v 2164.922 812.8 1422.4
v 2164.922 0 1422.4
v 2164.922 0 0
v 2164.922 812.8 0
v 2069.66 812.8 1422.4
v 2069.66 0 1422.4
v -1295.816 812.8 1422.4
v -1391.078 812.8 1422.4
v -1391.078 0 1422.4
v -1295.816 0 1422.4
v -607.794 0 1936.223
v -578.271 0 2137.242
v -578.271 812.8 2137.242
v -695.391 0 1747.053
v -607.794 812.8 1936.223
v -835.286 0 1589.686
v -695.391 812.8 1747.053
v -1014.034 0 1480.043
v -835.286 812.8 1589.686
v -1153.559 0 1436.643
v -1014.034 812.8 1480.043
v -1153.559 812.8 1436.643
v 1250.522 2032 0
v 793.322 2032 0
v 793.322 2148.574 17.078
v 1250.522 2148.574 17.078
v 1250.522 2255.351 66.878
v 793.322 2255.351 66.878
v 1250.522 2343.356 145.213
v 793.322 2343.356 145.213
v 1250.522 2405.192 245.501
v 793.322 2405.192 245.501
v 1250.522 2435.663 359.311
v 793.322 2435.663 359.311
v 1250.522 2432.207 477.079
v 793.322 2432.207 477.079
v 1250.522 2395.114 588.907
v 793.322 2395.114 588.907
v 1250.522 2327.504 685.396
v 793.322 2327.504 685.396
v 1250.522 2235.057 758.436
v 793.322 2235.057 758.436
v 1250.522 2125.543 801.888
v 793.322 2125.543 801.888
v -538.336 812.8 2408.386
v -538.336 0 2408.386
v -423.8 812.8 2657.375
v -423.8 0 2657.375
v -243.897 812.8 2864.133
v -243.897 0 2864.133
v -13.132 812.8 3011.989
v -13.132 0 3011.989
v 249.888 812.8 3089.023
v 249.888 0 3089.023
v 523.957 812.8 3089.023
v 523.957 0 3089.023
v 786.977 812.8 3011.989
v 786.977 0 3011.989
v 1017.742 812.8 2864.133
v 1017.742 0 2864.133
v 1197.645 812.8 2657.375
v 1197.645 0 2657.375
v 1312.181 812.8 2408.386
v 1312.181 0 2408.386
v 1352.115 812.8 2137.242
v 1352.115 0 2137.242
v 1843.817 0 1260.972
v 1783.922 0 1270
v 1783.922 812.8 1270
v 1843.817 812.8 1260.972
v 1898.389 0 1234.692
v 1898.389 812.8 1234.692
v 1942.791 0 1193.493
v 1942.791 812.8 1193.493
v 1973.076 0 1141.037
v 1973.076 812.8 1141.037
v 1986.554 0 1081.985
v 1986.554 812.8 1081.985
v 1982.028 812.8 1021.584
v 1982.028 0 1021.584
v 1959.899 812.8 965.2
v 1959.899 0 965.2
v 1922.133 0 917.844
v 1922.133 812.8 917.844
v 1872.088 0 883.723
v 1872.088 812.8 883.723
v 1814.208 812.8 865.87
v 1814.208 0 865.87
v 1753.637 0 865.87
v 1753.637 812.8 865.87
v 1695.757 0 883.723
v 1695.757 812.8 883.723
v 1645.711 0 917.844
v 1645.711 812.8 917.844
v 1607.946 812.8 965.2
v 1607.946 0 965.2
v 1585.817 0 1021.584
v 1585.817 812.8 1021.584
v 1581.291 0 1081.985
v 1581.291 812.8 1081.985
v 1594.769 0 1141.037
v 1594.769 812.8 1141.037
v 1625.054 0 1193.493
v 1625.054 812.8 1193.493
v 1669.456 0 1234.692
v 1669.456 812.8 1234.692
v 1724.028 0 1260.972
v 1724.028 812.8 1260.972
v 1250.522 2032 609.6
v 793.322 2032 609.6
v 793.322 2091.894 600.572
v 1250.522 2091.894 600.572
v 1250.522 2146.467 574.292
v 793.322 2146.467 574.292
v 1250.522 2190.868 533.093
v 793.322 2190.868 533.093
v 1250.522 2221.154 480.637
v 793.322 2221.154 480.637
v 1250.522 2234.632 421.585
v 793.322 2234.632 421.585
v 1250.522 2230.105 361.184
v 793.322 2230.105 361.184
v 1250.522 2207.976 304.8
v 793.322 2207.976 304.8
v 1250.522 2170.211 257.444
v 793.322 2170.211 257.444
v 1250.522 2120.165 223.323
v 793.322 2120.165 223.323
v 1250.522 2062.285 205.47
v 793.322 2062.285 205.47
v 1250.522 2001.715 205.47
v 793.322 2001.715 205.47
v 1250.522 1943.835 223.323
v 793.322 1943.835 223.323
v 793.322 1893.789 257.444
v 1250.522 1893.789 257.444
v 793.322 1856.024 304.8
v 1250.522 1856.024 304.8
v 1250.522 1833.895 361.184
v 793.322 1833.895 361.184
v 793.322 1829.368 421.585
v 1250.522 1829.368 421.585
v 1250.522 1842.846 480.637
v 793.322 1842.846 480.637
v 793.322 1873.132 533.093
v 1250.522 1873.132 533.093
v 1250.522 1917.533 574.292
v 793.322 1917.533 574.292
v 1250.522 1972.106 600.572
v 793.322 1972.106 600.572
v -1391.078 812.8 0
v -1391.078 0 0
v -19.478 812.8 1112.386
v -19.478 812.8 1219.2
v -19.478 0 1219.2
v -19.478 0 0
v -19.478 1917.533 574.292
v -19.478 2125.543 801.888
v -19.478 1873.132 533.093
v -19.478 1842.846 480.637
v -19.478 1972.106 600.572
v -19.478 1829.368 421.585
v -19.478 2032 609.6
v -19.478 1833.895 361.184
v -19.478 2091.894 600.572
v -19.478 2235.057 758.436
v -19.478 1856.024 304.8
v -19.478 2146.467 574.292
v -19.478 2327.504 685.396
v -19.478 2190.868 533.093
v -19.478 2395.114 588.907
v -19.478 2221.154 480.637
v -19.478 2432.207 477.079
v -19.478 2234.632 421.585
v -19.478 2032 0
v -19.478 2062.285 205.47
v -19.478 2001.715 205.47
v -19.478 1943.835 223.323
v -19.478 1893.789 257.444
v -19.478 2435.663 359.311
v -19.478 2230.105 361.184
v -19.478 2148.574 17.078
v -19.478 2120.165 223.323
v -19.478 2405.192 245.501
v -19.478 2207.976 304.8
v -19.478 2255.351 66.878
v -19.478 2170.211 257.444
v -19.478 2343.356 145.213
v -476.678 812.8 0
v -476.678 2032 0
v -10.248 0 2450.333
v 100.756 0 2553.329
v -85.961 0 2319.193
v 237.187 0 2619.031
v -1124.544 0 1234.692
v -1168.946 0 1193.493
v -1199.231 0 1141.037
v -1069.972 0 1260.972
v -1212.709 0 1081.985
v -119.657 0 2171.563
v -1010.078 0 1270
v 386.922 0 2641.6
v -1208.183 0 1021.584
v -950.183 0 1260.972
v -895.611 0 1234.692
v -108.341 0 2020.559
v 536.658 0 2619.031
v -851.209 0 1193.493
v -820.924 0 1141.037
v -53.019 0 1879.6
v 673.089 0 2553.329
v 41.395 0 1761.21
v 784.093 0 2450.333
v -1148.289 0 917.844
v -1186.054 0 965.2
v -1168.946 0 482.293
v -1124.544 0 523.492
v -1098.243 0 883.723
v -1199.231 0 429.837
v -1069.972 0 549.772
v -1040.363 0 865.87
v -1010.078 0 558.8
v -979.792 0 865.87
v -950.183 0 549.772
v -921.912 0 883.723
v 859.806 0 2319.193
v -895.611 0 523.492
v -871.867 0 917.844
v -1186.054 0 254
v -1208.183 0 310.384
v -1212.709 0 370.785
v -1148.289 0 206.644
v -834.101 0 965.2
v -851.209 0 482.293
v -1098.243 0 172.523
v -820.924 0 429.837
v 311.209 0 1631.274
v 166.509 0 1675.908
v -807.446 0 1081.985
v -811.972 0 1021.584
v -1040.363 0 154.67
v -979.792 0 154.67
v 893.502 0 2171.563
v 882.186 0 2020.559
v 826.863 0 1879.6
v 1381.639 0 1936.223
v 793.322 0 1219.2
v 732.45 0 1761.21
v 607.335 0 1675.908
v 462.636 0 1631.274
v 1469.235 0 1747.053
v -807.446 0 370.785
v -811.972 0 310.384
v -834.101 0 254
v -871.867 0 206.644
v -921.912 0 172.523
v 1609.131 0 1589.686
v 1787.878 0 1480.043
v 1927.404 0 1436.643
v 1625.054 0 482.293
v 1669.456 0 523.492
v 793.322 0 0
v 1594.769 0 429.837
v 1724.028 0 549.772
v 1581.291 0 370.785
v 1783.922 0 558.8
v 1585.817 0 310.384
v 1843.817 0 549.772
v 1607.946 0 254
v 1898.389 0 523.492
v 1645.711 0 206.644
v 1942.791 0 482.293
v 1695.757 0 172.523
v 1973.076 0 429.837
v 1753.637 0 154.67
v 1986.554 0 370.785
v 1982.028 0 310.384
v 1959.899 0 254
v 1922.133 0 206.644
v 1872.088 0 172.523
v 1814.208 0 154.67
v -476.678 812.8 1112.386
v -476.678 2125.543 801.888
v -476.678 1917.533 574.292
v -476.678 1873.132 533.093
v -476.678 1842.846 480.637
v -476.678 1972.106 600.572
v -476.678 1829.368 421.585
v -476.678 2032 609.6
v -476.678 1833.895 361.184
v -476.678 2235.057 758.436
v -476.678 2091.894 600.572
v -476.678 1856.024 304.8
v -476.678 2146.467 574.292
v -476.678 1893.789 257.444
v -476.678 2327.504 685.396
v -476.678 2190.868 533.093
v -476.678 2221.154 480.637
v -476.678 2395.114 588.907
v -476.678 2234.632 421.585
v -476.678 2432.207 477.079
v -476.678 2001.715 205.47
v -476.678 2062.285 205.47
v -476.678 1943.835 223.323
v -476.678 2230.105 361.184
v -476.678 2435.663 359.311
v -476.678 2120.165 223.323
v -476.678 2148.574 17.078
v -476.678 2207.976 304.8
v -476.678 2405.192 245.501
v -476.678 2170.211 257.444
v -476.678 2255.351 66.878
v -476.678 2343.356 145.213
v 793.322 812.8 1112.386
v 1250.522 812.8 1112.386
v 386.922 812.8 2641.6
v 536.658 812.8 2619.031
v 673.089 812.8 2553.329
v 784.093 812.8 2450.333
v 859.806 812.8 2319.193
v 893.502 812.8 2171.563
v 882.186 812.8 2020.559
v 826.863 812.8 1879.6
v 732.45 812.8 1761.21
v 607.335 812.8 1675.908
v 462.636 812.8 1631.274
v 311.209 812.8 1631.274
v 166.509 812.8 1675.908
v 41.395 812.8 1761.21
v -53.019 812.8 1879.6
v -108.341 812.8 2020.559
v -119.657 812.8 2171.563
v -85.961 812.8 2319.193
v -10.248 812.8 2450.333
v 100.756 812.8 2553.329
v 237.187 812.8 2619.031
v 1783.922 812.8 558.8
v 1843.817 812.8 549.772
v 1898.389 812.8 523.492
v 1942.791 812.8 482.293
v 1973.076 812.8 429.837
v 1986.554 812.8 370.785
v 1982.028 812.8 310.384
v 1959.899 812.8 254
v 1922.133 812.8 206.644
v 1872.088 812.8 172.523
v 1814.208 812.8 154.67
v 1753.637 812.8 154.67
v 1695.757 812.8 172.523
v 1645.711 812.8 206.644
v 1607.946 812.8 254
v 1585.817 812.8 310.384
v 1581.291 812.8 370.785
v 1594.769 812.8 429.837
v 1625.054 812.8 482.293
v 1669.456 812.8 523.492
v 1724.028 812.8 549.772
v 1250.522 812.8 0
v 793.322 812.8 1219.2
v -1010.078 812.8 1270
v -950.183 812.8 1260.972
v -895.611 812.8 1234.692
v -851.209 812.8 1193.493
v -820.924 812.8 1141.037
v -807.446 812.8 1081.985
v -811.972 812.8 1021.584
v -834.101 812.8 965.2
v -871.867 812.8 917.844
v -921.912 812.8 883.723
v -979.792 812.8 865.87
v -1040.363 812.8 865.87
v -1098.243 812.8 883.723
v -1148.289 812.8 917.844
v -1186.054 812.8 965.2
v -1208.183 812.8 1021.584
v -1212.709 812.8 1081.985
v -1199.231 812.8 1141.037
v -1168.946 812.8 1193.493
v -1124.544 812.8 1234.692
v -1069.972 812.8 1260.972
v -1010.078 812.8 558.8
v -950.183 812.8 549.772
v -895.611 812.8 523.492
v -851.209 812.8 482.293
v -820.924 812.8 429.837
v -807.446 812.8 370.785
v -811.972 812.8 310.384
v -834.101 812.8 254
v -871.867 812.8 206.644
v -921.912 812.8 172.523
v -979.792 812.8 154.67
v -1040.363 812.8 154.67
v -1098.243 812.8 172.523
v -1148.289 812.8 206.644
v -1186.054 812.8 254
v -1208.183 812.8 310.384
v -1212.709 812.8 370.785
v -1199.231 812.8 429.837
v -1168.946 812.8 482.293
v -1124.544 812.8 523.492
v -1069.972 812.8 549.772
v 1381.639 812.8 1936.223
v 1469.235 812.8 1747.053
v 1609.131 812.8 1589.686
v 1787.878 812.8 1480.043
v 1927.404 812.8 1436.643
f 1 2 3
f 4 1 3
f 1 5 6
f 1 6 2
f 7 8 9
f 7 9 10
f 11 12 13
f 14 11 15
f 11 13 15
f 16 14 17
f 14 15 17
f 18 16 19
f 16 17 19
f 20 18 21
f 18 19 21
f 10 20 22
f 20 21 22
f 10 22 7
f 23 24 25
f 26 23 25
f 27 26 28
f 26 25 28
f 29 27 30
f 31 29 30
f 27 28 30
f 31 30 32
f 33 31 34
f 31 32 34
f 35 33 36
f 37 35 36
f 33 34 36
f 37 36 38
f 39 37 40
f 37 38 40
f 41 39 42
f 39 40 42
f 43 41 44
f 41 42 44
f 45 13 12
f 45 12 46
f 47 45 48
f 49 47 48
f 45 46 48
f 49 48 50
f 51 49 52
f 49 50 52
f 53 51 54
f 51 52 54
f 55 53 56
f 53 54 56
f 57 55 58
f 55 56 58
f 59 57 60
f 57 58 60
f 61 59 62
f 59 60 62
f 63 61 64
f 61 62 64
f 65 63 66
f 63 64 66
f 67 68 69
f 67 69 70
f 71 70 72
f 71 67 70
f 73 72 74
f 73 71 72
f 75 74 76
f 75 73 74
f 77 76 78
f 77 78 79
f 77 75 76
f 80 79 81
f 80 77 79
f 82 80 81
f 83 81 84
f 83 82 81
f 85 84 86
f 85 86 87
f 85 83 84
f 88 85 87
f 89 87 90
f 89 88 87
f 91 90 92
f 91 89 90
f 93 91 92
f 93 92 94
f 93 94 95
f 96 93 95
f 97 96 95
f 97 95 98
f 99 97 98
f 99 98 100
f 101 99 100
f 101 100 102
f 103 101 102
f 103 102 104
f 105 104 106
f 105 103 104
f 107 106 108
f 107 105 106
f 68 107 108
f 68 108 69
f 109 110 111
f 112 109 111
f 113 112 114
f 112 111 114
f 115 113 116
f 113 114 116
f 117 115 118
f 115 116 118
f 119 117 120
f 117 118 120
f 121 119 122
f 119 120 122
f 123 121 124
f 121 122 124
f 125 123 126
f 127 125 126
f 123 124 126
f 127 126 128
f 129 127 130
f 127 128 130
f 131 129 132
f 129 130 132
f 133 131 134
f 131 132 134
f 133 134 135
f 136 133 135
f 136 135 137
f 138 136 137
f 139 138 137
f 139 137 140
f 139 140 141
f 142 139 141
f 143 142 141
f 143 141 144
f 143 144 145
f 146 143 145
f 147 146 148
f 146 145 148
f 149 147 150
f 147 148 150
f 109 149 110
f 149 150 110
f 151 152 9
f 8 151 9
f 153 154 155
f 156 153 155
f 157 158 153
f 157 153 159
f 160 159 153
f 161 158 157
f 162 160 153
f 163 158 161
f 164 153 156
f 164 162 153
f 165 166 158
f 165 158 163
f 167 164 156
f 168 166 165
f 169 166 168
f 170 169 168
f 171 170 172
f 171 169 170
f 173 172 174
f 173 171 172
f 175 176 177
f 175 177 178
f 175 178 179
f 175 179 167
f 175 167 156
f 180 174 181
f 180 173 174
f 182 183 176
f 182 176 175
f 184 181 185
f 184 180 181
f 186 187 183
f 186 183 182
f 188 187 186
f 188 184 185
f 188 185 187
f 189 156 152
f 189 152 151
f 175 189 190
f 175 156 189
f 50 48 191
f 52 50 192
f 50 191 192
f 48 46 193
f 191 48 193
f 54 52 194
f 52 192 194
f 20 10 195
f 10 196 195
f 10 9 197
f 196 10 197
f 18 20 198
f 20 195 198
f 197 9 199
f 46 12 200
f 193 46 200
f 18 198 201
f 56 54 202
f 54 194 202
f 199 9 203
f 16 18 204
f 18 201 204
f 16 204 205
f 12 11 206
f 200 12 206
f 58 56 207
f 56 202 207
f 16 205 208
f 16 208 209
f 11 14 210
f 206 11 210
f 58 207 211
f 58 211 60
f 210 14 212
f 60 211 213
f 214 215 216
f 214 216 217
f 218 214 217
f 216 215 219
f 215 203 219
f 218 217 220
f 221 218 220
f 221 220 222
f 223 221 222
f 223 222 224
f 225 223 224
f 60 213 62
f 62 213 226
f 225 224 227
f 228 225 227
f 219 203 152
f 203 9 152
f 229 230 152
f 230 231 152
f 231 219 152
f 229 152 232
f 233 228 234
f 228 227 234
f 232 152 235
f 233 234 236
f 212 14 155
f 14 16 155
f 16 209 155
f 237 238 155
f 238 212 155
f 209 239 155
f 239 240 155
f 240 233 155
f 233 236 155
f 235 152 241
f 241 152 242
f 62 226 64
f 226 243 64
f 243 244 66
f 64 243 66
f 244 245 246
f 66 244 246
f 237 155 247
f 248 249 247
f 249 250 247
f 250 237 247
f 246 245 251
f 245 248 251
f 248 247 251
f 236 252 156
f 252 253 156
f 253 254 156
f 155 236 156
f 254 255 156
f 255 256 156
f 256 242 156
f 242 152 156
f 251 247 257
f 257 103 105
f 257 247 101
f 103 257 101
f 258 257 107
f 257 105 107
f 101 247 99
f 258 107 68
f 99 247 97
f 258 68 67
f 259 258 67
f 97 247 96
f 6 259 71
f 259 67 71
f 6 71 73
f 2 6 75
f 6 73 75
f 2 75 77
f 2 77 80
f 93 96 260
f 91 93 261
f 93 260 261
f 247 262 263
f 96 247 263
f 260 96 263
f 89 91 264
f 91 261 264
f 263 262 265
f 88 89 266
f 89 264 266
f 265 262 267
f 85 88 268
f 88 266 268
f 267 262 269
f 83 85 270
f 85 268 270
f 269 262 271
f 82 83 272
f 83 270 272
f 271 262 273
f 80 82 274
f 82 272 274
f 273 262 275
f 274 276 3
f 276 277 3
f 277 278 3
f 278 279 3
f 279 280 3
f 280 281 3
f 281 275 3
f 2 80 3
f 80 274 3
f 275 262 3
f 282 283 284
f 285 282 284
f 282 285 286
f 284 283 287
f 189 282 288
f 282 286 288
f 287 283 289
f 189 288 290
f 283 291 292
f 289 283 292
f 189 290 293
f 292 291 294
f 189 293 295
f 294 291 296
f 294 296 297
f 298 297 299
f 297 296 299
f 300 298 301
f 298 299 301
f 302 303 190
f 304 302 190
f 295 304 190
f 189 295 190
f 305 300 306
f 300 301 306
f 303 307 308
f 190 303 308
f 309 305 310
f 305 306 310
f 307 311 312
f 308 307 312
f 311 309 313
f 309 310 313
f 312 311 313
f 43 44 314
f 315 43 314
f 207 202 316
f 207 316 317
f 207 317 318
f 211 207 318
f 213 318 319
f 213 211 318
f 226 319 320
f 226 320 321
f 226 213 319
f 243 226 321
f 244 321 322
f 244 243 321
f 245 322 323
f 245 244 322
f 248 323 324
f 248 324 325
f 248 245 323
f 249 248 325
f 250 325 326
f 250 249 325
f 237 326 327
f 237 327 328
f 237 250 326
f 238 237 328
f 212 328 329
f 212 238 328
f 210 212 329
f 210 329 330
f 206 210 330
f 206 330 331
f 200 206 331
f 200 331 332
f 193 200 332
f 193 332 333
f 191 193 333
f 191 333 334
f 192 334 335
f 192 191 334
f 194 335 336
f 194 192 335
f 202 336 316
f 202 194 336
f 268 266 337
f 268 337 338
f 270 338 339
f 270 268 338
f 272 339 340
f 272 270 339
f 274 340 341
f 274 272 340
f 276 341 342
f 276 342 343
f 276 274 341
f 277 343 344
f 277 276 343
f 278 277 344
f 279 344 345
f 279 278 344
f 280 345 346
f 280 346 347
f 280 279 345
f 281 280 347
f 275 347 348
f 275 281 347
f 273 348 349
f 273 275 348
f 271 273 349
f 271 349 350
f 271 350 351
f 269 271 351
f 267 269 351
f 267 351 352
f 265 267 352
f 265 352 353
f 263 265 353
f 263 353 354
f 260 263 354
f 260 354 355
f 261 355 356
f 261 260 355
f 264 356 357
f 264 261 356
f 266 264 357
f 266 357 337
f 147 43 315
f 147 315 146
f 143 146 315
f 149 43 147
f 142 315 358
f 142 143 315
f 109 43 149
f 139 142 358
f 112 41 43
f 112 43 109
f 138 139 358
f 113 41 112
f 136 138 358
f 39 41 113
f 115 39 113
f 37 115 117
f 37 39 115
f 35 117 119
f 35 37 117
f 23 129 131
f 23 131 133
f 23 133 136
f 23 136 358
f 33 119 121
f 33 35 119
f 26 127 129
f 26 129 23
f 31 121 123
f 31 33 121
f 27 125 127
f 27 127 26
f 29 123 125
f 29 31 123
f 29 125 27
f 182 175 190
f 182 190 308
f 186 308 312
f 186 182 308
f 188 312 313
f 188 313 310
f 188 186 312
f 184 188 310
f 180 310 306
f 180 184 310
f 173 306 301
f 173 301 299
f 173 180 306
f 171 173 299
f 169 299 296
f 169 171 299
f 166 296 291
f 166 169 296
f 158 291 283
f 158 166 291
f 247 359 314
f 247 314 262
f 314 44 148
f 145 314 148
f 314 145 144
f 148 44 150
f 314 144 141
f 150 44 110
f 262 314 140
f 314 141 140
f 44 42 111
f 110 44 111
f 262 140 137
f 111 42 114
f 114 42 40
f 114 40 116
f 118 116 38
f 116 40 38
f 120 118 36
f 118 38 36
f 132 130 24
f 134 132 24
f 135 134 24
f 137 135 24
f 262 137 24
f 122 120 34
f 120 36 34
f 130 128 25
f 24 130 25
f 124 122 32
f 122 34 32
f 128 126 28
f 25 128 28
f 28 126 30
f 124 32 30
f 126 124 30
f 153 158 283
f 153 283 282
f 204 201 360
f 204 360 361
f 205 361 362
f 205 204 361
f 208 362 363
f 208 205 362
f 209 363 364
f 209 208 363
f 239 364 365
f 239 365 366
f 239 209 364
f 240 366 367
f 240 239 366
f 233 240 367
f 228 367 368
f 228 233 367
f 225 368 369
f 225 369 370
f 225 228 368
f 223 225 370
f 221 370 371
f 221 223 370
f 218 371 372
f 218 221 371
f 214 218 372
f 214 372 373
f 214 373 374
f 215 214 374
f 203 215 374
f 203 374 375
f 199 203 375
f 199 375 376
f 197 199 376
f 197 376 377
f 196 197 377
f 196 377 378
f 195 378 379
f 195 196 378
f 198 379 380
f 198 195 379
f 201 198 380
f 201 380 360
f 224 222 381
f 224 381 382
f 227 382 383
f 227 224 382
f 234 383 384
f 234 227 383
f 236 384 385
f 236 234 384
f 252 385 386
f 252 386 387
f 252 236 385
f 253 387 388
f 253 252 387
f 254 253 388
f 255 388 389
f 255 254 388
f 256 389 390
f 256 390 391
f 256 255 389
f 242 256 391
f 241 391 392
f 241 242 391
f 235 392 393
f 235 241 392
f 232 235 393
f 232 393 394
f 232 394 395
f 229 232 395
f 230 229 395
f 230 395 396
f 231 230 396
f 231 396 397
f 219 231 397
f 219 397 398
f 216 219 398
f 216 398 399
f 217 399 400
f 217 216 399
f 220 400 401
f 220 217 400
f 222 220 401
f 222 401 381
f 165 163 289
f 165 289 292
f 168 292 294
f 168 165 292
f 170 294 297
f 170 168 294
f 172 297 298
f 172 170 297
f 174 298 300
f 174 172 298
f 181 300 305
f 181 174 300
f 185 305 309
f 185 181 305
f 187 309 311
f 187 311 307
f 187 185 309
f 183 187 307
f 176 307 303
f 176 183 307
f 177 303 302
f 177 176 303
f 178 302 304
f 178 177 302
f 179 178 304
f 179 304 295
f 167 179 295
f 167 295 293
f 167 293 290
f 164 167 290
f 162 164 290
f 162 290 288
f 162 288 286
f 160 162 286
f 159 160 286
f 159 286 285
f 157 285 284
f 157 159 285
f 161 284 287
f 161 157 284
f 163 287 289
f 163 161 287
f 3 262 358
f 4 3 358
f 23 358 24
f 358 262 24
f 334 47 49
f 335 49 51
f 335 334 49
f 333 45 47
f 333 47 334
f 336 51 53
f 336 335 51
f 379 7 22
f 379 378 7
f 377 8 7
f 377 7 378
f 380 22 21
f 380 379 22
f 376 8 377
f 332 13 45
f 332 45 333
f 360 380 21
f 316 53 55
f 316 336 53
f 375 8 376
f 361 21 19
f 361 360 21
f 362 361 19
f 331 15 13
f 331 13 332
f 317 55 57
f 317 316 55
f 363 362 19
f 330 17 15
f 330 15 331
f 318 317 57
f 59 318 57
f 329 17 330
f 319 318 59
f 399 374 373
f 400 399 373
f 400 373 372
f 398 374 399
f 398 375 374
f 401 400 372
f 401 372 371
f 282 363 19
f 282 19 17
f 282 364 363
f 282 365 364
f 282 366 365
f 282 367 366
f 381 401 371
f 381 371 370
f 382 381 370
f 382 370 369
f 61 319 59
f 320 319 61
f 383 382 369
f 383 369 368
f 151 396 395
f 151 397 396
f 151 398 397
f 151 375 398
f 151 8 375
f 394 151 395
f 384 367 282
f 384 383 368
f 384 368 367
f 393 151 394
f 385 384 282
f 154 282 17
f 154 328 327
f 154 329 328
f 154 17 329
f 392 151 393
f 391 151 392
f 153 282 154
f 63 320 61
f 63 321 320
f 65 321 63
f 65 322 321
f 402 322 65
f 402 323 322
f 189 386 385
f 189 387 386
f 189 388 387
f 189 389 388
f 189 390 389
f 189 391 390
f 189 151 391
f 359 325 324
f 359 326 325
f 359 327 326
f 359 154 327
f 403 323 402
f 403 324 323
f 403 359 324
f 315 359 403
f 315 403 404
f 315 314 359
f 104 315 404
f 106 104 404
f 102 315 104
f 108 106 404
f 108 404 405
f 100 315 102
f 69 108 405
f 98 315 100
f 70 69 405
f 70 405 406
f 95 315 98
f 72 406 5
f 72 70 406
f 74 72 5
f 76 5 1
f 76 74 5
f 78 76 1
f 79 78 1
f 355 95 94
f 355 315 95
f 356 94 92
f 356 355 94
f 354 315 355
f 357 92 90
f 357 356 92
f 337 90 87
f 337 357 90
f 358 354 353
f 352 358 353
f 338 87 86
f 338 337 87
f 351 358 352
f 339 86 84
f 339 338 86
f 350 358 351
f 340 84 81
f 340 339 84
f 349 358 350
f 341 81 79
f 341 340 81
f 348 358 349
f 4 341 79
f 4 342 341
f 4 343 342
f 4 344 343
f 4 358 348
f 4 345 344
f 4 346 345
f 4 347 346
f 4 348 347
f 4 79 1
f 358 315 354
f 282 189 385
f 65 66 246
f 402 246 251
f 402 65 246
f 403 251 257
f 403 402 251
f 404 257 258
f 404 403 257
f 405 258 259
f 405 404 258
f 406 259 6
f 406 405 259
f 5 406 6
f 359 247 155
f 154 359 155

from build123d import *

# Parameters (mm, degrees)
SKETCH_1_R      = 508
SKETCH_1_R_2    = 203.2
EXTRUDE_1_DEPTH = 812.8
FILLET_3_R      = 717.55
SKETCH_5_R      = 203.2
EXTRUDE_4_DEPTH = 457.2


with BuildPart() as part:
    # 草图1 → 凸台-拉伸1 (new body)
    with BuildSketch(Plane(origin=(0, 0, 0), x_dir=(1, 0, 0), z_dir=(0, 1, 0))):
        with BuildLine():
            Line((-578.277634848, -1422.4), (-578.277634848, -2133.6))
            ThreePointArc((-578.277634848, -2133.6), (386.922365152, -3098.8), (1352.122365152, -2133.6))
            Line((1352.122365152, -2133.6), (1352.122365152, -1422.4))
            Line((1352.122365152, -1422.4), (2164.922365152, -1422.4))
            Line((2164.922365152, -1422.4), (2164.922365152, 0))
            Line((2164.922365152, 0), (793.322365152, 0))
            Line((793.322365152, 0), (793.322365152, -1219.2))
            Line((793.322365152, -1219.2), (-19.477634848, -1219.2))
            Line((-19.477634848, -1219.2), (-19.477634848, 0))
            Line((-19.477634848, 0), (-1391.077634848, 0))
            Line((-1391.077634848, 0), (-1391.077634848, -1422.4))
            Line((-1391.077634848, -1422.4), (-578.277634848, -1422.4))
        make_face()
        with Locations(Location((386.922365152, -2133.6, 0), (0, 0, 270))):
            Circle(SKETCH_1_R, mode=Mode.SUBTRACT)
        with Locations(Location((1783.922365152, -1066.8, 0), (0, 0, 270))):
            Circle(SKETCH_1_R_2, mode=Mode.SUBTRACT)
        with Locations(Location((1783.922365152, -355.6, 0), (0, 0, 270))):
            Circle(SKETCH_1_R_2, mode=Mode.SUBTRACT)
        with Locations(Location((-1010.077634848, -1066.8, 0), (0, 0, 270))):
            Circle(SKETCH_1_R_2, mode=Mode.SUBTRACT)
        with Locations(Location((-1010.077634848, -355.6, 0), (0, 0, 270))):
            Circle(SKETCH_1_R_2, mode=Mode.SUBTRACT)
    extrude(amount=EXTRUDE_1_DEPTH)

    # 圆角3
    fillet_3_edges = [part.edges().sort_by_distance(p)[0] for p in [
        (1352.122365152, 406.4, 1422.4),
        (-578.277634848, 406.4, 1422.4),
    ]]
    fillet(fillet_3_edges, radius=FILLET_3_R)

    # 草图5 → 凸台-拉伸4 (add)
    with BuildSketch(Plane.ZY.offset(-793.322365152)):
        with BuildLine():
            Line((0, 812.8), (0, 2032))
            ThreePointArc((0, 2032), (359.311227426, 2435.662739793), (801.887832172, 2125.543223183))
            Line((801.887832172, 2125.543223183), (1112.385962125, 812.8))
            Line((1112.385962125, 812.8), (0, 812.8))
        make_face()
        with Locations((406.4, 2032)):
            Circle(SKETCH_5_R, mode=Mode.SUBTRACT)
    extrude_4 = extrude(amount=-EXTRUDE_4_DEPTH)

    # 镜向1: 凸台-拉伸4 across plane
    add(extrude_4.mirror(Plane.ZY.offset(-386.922365152)))


solid = part.part
